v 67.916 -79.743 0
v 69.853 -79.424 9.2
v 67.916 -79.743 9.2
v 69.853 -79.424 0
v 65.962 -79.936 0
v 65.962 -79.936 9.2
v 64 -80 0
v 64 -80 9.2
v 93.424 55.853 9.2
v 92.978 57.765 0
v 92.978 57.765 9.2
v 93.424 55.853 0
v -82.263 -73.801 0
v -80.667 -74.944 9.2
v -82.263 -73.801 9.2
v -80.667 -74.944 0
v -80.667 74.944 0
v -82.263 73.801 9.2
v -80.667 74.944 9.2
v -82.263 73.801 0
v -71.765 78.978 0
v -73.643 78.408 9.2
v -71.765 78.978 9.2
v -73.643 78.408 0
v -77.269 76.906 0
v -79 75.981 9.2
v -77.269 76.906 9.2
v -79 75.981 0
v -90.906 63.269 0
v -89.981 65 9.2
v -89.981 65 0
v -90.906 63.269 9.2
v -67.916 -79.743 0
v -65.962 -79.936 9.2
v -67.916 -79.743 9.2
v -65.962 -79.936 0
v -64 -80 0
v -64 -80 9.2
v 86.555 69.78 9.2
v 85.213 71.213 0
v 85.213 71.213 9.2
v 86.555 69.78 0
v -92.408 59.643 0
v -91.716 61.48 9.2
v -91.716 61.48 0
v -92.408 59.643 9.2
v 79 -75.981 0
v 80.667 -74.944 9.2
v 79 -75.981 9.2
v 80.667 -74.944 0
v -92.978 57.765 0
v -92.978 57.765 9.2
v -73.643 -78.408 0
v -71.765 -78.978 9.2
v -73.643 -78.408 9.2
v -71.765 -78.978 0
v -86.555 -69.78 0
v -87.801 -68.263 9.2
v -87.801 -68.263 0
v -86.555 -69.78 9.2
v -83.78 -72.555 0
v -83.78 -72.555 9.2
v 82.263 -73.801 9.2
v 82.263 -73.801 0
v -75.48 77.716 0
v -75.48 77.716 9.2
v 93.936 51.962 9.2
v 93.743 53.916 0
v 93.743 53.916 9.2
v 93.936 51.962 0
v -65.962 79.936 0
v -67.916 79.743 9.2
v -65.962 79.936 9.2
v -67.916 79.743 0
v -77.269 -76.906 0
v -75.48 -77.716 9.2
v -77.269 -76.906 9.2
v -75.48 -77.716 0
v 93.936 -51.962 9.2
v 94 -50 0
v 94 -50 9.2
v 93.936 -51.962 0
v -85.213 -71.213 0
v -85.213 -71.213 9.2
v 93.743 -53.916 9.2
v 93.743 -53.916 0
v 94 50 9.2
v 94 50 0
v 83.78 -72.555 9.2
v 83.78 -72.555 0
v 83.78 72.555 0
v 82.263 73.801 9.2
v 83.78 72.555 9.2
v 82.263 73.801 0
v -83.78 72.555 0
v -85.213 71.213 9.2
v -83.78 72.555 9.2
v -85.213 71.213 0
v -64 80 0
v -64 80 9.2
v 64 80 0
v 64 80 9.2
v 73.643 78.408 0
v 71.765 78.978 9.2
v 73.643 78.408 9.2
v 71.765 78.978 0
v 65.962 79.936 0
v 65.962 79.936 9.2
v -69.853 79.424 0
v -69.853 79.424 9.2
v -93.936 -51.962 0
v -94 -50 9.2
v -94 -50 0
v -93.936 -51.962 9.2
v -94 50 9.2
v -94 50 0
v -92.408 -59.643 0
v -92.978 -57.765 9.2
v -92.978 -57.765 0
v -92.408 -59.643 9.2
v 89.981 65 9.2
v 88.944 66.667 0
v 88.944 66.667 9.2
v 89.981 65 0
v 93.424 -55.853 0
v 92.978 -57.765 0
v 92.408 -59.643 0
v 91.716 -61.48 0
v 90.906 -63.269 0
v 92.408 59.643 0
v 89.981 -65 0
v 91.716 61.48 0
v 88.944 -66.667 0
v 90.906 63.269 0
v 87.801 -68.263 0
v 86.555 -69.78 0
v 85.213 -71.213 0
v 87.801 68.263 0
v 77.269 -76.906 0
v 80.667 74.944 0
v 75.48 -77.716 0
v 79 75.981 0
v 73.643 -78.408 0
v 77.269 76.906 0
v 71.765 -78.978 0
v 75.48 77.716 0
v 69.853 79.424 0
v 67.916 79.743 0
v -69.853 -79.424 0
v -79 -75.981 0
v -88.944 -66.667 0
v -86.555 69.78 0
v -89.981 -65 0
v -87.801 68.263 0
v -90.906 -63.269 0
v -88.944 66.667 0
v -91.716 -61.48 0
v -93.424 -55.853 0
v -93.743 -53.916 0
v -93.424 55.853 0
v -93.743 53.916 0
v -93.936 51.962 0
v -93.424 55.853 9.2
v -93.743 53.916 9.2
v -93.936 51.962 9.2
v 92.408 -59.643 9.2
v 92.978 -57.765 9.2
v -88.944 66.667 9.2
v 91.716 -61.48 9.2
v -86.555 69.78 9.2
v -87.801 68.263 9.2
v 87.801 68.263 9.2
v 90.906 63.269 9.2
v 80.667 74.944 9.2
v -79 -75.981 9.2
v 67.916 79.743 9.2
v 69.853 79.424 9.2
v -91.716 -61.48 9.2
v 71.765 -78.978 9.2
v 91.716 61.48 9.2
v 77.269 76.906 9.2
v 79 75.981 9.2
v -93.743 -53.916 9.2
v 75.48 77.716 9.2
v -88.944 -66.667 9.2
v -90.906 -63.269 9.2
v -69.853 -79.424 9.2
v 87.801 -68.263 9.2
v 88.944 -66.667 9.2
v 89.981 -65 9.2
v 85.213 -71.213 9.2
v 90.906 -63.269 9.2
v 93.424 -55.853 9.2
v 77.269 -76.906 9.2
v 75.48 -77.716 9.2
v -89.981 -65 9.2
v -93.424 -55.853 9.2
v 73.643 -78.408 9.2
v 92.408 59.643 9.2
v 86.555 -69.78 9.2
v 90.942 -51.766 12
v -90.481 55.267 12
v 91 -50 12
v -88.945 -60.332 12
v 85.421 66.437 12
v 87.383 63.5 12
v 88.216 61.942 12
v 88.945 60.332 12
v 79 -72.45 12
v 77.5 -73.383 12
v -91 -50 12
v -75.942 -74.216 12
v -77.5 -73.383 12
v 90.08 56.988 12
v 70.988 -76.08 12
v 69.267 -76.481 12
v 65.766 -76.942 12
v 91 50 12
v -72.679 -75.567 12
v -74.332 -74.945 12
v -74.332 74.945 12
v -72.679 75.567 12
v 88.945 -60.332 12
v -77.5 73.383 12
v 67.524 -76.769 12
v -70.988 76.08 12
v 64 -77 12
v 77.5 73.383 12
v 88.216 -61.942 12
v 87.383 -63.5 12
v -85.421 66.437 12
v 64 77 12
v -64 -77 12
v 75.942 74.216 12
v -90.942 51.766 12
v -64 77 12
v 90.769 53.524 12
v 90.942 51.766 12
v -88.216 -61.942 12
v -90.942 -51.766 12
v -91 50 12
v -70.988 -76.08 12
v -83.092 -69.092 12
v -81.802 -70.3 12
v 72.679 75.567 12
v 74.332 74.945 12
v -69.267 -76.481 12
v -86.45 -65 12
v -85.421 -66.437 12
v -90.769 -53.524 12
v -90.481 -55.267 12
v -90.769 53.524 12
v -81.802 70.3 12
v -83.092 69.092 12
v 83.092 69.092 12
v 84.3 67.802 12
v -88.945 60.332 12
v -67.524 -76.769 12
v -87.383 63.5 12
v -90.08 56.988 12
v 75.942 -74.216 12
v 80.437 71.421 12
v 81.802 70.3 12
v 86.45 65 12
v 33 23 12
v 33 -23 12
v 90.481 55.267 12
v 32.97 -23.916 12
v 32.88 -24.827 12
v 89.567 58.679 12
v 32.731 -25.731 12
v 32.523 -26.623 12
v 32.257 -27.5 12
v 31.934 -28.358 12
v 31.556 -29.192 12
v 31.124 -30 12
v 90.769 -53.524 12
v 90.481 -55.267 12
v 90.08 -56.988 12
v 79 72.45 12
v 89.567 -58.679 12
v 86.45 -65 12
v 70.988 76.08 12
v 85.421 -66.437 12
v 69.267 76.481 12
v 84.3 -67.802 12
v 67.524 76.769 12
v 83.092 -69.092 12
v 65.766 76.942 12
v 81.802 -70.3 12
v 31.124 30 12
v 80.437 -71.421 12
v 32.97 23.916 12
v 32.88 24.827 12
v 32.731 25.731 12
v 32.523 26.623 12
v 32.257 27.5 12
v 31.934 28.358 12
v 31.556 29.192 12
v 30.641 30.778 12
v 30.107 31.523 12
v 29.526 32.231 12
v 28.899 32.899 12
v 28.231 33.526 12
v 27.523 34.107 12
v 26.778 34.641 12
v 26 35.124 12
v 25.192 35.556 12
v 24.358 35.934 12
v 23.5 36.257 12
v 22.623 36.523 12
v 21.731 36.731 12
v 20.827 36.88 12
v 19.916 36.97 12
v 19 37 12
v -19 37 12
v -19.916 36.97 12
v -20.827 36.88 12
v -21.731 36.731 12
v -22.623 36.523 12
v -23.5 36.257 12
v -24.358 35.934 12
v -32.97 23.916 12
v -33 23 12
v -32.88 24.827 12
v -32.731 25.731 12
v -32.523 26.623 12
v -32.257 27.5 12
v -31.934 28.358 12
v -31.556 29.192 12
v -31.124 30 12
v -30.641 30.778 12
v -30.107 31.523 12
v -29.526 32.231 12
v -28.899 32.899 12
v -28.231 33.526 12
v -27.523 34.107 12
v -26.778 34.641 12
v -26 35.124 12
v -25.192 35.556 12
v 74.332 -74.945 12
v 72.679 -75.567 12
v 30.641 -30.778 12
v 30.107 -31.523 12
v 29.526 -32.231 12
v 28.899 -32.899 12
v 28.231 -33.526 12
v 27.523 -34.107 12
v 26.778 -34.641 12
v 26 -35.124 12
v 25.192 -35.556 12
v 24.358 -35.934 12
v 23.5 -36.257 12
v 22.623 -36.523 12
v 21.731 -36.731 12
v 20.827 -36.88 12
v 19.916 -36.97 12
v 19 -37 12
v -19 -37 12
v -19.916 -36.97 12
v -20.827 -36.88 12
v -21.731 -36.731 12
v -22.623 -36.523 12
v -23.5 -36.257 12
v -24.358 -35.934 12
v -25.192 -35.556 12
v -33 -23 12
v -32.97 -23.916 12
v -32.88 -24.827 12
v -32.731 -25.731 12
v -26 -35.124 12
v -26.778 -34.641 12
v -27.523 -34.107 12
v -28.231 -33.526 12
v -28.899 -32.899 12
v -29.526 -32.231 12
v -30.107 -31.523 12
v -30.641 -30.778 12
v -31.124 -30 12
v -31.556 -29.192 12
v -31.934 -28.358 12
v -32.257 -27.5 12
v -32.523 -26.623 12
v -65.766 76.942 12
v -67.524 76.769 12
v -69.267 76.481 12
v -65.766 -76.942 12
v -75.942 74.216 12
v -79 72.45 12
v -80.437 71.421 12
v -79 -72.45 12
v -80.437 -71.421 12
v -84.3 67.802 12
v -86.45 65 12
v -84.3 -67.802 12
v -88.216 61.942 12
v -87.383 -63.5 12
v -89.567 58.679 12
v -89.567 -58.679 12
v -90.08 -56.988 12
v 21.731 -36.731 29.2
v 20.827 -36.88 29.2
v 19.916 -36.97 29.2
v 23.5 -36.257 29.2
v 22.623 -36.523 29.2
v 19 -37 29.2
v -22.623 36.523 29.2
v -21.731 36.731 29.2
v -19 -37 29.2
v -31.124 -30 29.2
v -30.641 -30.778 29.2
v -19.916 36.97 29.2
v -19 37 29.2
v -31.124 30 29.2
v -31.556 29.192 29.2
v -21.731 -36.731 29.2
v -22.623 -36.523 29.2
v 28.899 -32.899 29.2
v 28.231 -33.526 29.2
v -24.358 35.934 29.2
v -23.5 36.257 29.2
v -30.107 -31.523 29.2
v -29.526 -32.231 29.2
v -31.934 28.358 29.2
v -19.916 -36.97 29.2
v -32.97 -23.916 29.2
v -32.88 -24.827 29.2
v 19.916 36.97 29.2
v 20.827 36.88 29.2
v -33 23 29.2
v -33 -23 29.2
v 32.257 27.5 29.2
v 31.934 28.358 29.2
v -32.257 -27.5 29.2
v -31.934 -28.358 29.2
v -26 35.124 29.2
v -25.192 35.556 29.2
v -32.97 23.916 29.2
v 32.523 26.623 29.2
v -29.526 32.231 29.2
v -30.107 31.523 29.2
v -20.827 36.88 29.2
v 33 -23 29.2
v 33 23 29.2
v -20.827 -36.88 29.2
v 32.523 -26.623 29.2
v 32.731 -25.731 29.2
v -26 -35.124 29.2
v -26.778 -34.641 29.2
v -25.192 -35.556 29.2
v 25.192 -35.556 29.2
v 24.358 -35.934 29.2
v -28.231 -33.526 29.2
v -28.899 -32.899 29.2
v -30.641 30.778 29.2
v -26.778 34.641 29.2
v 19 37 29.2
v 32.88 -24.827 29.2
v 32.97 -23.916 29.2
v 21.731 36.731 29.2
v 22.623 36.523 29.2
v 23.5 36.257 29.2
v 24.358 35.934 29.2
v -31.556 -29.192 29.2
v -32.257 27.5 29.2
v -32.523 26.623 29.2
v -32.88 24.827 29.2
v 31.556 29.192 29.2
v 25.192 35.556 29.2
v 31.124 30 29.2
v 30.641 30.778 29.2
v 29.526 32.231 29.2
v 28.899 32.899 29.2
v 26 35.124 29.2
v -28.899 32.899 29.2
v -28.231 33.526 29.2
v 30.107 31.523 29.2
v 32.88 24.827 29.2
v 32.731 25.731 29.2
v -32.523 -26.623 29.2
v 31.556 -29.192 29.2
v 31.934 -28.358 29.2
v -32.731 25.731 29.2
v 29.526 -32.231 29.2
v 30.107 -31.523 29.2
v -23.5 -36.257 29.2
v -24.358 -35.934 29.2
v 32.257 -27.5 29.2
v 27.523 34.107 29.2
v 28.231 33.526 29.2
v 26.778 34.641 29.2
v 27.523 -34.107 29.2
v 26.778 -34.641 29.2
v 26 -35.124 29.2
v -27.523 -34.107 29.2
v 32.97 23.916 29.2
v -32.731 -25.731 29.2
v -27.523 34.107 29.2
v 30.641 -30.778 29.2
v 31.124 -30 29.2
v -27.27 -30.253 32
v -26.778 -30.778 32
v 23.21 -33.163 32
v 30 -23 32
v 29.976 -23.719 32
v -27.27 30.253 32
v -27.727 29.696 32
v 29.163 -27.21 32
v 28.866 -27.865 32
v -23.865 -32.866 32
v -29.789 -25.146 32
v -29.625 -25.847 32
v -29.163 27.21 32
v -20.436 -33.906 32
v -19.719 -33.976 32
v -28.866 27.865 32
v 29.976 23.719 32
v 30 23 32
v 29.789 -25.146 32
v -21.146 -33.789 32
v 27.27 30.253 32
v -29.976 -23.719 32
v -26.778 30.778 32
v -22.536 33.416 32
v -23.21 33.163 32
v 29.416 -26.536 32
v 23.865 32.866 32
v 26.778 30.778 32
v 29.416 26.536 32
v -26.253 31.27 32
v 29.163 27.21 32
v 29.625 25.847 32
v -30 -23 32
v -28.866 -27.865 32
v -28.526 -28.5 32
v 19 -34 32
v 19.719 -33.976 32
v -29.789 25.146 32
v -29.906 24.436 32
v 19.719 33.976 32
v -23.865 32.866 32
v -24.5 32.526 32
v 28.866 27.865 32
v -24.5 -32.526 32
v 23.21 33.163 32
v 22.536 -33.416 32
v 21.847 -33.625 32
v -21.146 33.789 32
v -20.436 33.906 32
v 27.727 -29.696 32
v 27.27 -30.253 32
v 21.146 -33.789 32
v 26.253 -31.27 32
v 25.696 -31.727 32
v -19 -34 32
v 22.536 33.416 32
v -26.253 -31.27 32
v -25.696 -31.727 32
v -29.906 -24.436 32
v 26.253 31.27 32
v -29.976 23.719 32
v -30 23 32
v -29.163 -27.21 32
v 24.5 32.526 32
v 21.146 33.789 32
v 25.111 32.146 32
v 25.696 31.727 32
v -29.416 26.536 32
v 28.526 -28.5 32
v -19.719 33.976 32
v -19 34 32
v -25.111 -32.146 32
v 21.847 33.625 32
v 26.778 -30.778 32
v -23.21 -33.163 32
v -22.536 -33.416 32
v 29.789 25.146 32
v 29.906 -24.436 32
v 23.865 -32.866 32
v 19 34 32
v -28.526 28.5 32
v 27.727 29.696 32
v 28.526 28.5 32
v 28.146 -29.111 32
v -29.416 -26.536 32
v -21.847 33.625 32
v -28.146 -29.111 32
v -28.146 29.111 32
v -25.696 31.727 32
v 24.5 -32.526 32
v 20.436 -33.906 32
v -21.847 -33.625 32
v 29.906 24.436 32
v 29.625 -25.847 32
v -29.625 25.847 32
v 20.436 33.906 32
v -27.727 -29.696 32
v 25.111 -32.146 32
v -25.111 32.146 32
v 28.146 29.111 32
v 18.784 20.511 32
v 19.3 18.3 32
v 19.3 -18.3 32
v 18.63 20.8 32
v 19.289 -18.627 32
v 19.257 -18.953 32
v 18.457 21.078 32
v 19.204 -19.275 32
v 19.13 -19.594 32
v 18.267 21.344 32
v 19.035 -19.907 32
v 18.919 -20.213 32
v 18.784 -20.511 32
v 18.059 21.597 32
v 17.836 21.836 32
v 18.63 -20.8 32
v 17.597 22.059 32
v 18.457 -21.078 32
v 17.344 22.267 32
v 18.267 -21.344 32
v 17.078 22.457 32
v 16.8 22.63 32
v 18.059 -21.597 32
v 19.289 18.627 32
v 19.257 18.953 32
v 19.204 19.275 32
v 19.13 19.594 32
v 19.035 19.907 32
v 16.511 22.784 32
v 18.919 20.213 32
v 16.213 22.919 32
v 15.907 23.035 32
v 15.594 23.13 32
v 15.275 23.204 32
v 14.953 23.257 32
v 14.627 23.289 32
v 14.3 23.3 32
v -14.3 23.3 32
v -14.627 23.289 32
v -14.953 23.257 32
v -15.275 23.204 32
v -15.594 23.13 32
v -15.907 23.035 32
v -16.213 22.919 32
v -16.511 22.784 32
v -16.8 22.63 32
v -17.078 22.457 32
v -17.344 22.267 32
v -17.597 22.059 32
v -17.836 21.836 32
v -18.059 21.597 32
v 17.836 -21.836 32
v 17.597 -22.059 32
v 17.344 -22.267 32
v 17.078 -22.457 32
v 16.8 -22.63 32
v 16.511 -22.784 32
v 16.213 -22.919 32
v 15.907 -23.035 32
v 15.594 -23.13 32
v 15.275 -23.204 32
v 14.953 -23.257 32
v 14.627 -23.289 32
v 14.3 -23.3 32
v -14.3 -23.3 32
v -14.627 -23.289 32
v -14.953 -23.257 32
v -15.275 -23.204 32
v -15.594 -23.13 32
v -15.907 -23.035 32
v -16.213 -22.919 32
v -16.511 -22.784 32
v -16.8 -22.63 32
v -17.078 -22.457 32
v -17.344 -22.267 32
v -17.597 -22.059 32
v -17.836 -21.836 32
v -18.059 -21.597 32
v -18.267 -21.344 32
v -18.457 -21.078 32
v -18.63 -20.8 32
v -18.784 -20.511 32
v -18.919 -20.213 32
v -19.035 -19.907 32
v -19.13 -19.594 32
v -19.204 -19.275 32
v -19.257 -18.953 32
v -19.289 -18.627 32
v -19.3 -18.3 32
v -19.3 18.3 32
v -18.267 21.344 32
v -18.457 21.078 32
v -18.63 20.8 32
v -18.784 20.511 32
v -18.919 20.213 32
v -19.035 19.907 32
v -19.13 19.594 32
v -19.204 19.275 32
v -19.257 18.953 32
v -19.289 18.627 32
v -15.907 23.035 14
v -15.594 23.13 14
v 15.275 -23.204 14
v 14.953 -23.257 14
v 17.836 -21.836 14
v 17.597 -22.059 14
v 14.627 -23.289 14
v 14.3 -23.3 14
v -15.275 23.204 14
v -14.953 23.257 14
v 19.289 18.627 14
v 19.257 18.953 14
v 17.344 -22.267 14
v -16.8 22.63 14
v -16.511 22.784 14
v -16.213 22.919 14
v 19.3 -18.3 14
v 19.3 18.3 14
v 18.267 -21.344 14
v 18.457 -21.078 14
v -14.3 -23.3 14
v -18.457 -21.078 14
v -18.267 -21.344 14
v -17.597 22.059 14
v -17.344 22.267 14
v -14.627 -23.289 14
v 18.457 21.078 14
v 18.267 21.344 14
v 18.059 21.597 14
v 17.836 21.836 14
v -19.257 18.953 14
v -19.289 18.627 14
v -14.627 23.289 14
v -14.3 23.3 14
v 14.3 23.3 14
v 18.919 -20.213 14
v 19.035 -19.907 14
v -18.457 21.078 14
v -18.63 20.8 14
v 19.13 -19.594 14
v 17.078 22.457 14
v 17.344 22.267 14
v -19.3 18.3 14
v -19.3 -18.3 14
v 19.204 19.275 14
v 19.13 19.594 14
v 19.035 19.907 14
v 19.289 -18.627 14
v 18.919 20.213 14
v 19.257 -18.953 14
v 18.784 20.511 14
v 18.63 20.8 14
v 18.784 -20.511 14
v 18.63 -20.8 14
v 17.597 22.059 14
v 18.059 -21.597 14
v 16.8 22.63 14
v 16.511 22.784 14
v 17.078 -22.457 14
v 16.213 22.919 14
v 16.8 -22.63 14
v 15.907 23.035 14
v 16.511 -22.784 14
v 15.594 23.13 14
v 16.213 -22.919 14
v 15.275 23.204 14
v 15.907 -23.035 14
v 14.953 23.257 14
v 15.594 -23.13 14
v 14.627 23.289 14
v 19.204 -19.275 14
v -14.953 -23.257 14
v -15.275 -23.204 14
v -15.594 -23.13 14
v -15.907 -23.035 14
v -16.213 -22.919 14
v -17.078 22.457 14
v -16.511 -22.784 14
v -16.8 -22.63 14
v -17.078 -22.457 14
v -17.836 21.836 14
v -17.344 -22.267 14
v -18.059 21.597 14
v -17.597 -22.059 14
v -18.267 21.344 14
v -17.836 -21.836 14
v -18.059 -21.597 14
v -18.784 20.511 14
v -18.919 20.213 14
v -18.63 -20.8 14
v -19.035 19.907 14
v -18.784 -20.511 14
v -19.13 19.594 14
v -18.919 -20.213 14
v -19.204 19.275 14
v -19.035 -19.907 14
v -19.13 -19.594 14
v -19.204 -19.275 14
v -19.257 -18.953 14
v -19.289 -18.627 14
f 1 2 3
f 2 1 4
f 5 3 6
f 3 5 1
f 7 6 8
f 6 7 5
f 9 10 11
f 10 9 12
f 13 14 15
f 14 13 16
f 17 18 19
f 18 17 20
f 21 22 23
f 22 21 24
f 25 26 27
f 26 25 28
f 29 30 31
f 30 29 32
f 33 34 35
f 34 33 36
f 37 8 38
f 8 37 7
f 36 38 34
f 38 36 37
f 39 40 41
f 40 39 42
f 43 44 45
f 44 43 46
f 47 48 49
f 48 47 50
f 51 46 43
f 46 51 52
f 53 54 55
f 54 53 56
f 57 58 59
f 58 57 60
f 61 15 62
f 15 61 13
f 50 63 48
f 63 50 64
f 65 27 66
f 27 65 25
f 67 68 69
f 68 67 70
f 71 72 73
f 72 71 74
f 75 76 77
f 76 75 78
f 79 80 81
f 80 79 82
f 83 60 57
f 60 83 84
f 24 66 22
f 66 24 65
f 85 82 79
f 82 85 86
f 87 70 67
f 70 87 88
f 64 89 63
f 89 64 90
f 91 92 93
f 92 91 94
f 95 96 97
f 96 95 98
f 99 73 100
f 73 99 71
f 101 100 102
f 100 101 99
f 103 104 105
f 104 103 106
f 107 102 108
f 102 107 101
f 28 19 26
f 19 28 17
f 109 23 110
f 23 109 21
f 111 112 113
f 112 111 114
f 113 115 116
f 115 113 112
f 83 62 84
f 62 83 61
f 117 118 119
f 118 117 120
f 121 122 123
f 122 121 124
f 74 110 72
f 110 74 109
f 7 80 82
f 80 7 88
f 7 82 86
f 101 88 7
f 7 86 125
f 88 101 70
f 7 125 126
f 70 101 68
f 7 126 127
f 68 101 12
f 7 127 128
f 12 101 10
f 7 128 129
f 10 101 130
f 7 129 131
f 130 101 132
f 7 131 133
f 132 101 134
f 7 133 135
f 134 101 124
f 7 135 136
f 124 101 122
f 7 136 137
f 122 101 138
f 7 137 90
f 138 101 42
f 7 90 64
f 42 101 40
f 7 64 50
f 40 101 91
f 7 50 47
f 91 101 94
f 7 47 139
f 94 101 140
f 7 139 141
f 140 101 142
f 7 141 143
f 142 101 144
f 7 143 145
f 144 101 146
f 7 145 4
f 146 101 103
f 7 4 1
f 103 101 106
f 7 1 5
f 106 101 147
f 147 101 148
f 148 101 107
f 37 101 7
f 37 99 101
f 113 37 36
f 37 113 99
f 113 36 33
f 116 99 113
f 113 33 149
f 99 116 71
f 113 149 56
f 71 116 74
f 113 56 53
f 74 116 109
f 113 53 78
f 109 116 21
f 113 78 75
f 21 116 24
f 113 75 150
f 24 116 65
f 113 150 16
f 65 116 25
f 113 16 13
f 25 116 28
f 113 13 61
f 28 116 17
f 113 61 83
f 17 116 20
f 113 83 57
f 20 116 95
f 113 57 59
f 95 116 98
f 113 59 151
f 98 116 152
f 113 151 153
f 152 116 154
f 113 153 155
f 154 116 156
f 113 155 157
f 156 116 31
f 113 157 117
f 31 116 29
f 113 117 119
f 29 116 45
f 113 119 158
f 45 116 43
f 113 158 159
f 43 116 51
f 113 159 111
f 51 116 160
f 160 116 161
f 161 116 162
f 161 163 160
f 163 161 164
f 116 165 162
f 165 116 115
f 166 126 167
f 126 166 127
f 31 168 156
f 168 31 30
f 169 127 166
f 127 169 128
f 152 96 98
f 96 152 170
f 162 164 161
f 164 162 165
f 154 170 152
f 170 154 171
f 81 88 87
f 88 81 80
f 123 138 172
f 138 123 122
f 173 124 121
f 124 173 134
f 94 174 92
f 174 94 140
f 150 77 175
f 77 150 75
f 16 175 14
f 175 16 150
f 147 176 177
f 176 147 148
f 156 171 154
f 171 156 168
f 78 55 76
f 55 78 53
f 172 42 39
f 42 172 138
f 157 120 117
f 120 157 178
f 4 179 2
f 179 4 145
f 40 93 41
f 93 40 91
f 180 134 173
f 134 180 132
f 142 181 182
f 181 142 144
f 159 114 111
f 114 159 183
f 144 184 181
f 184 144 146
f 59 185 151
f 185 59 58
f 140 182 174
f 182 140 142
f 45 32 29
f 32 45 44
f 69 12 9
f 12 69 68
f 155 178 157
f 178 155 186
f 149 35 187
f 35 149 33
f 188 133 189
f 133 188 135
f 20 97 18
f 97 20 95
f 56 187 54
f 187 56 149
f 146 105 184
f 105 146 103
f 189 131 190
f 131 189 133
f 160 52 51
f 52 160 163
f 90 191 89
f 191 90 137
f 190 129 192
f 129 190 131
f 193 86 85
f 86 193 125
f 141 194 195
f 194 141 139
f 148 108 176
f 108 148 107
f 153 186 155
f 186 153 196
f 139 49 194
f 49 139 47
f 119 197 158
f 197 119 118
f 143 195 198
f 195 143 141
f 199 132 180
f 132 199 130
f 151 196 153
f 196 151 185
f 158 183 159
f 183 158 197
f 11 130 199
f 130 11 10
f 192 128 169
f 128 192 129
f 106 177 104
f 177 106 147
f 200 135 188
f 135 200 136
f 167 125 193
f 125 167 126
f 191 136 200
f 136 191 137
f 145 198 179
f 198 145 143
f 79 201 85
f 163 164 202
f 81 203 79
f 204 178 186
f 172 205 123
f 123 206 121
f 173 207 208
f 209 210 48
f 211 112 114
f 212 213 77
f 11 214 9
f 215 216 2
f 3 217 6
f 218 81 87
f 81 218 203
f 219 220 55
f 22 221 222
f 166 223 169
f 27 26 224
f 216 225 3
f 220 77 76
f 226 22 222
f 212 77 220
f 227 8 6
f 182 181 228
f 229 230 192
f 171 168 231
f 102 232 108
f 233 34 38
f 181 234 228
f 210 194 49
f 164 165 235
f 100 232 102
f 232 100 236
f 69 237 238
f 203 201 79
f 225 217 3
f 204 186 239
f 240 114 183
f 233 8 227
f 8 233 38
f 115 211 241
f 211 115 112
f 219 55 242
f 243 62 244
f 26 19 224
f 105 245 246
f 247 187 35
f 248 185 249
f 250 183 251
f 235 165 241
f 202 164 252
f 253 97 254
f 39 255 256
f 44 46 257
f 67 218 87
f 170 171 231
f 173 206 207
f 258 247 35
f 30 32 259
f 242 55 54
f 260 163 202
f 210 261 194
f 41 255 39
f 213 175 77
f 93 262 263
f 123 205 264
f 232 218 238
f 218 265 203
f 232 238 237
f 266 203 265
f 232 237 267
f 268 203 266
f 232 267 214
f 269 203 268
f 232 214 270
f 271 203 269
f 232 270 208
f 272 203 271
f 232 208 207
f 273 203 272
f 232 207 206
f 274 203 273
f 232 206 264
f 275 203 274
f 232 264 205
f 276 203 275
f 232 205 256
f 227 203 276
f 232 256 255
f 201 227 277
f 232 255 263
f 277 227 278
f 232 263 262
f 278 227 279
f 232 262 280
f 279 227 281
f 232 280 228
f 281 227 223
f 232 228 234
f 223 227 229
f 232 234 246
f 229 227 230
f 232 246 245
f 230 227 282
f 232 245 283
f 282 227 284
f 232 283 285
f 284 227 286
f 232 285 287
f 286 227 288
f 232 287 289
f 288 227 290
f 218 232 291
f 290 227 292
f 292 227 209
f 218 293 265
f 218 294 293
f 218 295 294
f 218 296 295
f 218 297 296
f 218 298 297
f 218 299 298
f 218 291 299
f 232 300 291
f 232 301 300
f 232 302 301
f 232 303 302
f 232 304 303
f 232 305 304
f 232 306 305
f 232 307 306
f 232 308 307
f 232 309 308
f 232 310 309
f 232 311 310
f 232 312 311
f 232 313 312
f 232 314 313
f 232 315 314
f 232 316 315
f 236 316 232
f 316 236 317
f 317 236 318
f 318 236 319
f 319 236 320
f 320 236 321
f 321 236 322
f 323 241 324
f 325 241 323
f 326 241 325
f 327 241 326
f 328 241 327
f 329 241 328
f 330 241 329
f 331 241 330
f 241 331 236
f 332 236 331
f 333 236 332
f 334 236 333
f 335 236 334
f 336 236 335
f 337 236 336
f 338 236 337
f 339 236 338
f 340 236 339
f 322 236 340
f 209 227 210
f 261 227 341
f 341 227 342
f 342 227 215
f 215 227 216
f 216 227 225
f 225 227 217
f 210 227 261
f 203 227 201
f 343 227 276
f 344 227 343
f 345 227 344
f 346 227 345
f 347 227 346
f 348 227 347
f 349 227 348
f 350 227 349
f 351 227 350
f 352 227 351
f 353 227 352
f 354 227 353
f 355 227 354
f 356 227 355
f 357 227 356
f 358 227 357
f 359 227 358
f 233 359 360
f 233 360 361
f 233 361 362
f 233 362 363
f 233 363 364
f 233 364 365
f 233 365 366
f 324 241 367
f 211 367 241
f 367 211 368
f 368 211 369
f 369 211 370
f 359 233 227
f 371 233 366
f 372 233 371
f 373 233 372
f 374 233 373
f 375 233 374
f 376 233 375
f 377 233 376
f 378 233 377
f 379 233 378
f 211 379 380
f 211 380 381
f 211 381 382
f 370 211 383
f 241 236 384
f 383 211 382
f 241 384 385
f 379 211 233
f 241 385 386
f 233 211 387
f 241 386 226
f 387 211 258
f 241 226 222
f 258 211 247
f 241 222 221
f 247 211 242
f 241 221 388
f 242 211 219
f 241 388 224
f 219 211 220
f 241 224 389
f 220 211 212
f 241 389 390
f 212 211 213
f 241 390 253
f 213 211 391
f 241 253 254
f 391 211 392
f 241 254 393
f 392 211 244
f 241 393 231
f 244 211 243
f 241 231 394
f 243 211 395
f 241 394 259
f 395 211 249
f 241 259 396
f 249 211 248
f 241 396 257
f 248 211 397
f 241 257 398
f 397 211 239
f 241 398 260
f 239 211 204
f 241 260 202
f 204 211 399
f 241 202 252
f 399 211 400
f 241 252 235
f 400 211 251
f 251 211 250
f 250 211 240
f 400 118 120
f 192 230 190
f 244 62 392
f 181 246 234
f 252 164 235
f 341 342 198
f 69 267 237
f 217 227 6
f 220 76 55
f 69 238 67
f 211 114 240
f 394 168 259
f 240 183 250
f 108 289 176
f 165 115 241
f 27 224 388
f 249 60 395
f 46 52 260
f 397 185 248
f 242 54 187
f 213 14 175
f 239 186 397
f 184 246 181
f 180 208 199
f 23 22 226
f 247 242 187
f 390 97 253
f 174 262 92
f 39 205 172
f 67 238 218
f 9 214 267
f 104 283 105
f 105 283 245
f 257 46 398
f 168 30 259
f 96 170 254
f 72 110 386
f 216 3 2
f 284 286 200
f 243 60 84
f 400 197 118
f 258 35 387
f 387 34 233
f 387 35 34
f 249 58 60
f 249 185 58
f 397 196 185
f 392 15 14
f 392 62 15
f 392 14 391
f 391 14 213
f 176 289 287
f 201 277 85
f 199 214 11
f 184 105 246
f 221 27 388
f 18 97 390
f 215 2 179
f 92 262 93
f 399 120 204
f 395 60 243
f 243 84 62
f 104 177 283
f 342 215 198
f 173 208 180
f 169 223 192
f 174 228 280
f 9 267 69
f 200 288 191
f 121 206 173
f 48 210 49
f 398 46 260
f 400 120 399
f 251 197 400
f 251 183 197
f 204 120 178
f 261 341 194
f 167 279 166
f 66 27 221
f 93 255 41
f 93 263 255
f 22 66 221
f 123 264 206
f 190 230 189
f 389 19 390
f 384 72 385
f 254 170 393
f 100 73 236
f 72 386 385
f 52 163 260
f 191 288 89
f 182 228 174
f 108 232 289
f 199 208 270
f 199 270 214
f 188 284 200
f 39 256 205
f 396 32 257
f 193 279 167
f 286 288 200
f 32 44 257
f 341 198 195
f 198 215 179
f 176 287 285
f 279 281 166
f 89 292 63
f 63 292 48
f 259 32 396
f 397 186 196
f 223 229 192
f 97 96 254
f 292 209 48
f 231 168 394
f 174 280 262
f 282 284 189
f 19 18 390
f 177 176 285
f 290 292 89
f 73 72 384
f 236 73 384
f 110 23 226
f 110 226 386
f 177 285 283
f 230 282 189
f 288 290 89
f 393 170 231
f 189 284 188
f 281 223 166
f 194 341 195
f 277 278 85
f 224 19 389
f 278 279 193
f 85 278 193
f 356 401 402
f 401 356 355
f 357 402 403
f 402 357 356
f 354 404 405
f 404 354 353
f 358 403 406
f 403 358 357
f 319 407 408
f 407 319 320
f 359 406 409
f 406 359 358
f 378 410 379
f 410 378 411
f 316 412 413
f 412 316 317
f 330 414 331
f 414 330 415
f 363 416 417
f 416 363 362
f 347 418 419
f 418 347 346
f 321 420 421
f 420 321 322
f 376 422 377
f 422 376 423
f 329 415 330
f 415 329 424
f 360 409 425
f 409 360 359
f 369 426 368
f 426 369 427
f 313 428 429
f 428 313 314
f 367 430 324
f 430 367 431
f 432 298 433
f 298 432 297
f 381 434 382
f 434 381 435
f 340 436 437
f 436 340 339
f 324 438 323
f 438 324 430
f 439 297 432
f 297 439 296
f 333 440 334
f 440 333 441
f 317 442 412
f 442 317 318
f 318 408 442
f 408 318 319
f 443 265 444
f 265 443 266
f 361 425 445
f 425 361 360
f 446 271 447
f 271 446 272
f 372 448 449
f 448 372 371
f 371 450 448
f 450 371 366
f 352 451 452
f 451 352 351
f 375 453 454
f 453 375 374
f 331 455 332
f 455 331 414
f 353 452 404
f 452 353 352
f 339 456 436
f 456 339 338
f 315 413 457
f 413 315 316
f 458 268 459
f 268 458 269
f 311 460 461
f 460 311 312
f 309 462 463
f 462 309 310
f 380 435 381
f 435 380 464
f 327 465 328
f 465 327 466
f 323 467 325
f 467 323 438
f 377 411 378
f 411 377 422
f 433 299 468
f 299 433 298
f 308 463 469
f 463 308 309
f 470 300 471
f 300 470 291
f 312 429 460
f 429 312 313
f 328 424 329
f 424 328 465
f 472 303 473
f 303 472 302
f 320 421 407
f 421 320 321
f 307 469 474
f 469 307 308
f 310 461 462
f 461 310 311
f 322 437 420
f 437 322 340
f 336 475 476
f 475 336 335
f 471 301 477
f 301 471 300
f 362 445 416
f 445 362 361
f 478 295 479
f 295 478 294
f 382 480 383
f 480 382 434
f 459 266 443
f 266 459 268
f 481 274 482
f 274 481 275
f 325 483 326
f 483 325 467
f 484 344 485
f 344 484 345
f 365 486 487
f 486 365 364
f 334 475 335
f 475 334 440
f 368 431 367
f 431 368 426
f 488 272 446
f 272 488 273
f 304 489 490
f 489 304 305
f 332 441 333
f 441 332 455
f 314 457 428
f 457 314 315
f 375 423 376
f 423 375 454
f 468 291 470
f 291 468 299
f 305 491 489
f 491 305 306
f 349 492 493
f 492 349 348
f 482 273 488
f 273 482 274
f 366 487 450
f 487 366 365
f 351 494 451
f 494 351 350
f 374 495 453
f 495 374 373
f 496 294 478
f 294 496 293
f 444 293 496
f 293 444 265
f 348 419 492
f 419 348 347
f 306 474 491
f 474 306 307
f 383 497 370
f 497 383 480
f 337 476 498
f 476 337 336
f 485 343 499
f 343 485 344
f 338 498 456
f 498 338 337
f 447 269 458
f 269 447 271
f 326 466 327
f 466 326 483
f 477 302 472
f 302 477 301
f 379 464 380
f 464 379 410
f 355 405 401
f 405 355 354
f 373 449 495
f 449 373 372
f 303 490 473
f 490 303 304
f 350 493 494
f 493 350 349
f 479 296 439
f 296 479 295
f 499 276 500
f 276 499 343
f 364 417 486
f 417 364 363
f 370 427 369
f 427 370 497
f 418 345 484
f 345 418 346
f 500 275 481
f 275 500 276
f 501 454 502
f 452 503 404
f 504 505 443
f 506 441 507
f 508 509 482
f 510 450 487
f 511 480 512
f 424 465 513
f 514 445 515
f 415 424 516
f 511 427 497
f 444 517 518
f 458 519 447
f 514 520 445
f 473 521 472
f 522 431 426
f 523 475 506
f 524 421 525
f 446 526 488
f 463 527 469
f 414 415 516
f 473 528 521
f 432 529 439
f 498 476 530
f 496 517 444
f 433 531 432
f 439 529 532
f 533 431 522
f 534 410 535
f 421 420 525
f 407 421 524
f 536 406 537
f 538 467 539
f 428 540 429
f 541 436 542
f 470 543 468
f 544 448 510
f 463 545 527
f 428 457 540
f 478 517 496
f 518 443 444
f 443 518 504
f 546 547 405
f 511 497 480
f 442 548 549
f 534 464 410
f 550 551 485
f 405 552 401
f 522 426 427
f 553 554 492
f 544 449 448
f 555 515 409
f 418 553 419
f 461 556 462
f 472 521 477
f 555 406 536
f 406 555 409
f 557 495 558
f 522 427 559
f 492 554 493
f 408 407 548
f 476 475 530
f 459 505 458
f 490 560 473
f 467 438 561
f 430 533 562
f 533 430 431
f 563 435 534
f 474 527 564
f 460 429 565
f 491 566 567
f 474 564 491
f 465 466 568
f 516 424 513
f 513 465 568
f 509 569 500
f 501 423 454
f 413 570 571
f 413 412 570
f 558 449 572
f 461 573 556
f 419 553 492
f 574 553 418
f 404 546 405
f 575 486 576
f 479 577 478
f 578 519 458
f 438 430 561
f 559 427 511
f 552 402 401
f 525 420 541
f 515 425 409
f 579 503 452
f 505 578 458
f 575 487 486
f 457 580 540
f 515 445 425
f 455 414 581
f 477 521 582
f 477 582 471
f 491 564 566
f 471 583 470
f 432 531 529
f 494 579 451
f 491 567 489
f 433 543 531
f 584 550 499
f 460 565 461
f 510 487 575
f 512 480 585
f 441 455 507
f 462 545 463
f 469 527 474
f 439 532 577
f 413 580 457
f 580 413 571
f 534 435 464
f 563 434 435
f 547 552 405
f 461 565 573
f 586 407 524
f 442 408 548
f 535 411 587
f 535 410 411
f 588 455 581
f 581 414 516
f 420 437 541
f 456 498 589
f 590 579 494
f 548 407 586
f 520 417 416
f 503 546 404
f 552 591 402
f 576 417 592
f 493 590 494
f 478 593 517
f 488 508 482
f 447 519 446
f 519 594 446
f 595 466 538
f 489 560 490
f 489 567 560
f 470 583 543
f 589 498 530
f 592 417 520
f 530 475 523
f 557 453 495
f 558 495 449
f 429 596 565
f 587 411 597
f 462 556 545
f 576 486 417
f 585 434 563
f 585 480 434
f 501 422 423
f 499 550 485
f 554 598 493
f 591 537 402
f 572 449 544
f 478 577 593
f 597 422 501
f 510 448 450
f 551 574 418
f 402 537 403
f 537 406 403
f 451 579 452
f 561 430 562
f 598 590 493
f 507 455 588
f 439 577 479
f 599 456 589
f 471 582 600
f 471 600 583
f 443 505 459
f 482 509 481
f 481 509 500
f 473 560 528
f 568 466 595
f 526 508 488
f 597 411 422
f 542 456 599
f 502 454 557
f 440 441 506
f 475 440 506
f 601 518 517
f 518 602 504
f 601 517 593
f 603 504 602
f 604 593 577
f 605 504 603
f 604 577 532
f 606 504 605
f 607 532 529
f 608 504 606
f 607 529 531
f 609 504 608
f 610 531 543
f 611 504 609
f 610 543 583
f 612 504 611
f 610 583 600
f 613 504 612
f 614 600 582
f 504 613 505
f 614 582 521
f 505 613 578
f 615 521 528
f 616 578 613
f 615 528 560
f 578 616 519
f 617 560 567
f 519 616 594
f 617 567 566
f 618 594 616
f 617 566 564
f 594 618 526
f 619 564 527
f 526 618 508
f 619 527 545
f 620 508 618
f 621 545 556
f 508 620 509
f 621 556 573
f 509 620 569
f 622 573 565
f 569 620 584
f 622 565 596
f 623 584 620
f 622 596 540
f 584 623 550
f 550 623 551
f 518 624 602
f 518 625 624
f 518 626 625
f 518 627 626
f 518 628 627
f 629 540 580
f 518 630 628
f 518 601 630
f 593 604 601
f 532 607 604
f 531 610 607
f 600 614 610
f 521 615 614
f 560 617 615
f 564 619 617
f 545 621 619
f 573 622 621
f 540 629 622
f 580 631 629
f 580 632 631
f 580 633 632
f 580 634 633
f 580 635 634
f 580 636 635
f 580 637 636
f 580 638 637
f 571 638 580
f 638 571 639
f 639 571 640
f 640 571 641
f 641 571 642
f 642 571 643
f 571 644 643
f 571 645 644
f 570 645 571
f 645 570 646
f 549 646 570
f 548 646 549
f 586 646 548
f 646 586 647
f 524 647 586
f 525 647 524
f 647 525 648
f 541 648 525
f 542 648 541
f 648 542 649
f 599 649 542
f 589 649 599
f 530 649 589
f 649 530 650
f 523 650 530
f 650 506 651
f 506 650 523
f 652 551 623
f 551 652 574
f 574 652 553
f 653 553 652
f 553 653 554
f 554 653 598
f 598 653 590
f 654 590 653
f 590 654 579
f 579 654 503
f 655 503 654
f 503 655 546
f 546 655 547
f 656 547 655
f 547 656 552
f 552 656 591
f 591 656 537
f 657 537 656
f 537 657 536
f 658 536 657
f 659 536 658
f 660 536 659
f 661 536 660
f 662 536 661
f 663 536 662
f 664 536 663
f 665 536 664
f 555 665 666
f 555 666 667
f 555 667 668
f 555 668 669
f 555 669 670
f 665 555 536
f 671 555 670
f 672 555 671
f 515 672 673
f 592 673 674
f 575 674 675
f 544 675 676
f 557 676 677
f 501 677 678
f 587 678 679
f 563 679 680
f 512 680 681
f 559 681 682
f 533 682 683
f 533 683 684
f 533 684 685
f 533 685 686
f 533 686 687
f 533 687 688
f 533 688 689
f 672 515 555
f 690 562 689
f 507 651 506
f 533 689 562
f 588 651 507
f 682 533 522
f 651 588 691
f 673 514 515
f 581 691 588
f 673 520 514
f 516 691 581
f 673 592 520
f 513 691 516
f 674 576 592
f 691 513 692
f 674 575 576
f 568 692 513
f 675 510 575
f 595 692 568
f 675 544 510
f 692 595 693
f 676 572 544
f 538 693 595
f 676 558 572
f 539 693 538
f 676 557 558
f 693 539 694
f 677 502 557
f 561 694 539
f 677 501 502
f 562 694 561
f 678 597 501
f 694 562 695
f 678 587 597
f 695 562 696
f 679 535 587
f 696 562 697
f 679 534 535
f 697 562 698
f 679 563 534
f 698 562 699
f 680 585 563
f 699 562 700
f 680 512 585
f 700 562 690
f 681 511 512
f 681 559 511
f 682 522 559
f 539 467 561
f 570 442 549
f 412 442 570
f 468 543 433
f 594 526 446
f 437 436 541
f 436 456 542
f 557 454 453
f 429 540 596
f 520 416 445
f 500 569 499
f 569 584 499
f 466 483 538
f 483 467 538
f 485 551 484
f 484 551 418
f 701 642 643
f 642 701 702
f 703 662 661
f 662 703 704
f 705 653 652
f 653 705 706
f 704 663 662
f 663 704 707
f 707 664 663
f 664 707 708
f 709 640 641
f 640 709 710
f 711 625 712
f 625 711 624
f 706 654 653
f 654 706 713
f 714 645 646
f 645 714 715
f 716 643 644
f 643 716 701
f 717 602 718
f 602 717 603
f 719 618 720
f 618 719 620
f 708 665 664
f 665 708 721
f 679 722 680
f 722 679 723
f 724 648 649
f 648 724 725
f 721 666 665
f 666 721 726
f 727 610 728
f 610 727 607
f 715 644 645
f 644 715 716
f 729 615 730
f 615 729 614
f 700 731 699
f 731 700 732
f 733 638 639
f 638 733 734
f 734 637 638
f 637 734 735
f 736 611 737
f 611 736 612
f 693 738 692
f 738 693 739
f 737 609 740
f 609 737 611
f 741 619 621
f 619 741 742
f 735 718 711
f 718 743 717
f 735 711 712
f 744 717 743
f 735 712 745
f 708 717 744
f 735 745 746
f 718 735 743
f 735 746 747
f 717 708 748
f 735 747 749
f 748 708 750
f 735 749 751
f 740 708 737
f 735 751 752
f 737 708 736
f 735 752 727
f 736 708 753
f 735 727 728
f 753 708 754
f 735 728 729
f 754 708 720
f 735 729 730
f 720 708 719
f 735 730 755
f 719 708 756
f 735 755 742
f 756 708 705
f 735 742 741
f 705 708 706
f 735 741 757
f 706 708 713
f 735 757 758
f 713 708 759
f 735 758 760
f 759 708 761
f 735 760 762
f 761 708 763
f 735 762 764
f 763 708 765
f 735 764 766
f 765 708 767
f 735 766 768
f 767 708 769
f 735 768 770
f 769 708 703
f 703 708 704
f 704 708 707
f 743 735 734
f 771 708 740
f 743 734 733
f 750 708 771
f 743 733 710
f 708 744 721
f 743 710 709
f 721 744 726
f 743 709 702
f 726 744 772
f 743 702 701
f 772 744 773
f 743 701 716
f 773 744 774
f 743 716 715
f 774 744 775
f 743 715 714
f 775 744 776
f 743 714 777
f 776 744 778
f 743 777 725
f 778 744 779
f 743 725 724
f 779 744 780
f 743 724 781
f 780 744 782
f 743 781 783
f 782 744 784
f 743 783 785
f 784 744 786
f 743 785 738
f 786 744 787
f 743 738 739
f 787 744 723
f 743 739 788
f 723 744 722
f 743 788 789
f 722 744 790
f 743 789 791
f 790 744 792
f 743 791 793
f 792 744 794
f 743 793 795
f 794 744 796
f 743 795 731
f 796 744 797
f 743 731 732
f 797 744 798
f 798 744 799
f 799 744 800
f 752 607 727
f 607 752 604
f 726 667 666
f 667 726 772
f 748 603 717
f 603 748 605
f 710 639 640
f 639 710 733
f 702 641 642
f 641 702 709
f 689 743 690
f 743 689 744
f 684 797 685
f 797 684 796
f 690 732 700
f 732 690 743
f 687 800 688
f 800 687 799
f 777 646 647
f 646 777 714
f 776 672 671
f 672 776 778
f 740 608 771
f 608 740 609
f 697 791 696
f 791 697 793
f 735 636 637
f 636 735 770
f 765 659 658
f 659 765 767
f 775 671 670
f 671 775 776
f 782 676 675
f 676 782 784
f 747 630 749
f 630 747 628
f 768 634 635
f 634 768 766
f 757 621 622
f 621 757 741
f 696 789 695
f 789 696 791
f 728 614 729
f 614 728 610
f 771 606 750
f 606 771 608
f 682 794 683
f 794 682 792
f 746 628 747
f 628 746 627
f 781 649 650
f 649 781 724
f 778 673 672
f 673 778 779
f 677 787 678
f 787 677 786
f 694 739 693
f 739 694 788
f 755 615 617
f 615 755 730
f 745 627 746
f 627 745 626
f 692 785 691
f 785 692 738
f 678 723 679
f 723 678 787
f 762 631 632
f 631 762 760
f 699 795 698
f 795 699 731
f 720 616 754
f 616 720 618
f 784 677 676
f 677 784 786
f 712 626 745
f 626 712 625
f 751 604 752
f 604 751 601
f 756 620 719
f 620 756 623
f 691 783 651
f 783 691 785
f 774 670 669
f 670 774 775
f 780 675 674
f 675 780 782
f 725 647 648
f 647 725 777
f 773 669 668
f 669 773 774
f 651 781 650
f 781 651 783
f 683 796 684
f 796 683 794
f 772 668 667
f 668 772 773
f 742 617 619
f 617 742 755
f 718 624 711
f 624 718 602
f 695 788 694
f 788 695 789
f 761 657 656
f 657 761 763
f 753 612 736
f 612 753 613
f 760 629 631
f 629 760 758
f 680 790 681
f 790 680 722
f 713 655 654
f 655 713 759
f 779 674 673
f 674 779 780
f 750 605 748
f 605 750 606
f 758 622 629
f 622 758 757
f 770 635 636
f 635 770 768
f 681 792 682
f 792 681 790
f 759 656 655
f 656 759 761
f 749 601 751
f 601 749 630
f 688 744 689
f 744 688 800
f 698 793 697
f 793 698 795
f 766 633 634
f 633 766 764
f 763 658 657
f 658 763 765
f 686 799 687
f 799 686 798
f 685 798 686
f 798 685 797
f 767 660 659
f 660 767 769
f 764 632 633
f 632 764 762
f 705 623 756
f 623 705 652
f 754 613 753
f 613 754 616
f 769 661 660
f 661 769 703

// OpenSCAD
// Headphone stand in three printable parts: base, post, hanger.
// No glue, no screws. Rectangular (non-round) blade tenons prevent spinning.
// All dimensions in mm. Print orientation is the exported orientation (+Z up).
//
// Assembly heights (assembly coordinates, desk at z=0):
//   base plate/boss top        0 .. 32
//   post                       14.5 .. 250  (17.5 mm of it inside the base socket)
//   hanger tenon               228.5 .. 250 (21.5 mm inside the post socket)
//   hanger saddle top centre   270
// Socket clearances: 0.3 mm per side (socket is tenon + 0.6 in each dimension),
// tenon tips stop 0.5 mm above socket floors; shoulders/faces give the depth stop
// for the hanger, and the post bottoms in its socket.

part = "base"; // [base, post, hanger, assembly]
cadverify_only = "";

$fn = 96;

/* [Base] */
base_w = 188;          // desk footprint, X
base_d = 160;          // desk footprint, Y
base_plate_top = 9;    // straight plate wall up to here, then 45 deg chamfer to 12
base_top_plate = 12;
boss_w = 66;
boss_d = 74;
boss_straight_top = 29; // then 45 deg chamfer to boss_top
boss_top = 32;
base_socket_w = 38.6;  // post 38 + 0.6
base_socket_d = 46.6;  // post 46 + 0.6
base_socket_floor = 14;

/* [Post] */
post_w = 38;
post_d = 46;
post_len = 235.5;      // tip (local z=0) to top (assembly 250)
post_top_socket_w = 24.6; // hanger tenon 24 + 0.6
post_top_socket_d = 34.6; // hanger tenon 34 + 0.6
post_top_socket_floor_local = 213.5; // assembly 228

/* [Hanger, modelled in print coordinates] */
// Print coordinates: X = saddle length, Y = height above tenon tip,
// Z = saddle width direction (part lies on its Z=0 side face on the bed).
hang_len_half = 69;    // overall saddle half length incl. rounded end point
hang_width = 34;       // >= 30 mm headband support width
hang_top_rel = 41.5;   // tenon tip to saddle crown; assembly 228.5 + 41.5 = 270
hang_arc_r = 170;      // crown radius of the headband contact surface
hang_plate_t = 10;     // saddle plate thickness (vertical, in profile)
hang_tenon_half_w = 12;  // tenon is 24 (X) x 34 (width)
hang_shoulder_rel = 21.5; // assembly 250, post top
hang_neck_half_w = 17;

function hang_top_z(x) = hang_top_rel - (hang_arc_r - sqrt(hang_arc_r*hang_arc_r - x*x));
function hang_bot_z(x) = hang_top_z(x) - hang_plate_t;

module rounded_rect(w, d, r) {
    offset(r = r) square([w - 2*r, d - 2*r], center = true);
}

module instance(name, part_name, unit = 1) {
    echo(cadverify_instance = [name, part_name, unit]);
    if (cadverify_only == "" || cadverify_only == name) children();
}

/* ---------- BASE (print = assembly orientation) ---------- */
module base_part() {
    difference() {
        union() {
            // desk plate with 45 deg top edge chamfer
            linear_extrude(base_plate_top) rounded_rect(base_w, base_d, 30);
            hull() {
                translate([0, 0, base_plate_top]) linear_extrude(0.2)
                    rounded_rect(base_w, base_d, 30);
                translate([0, 0, base_top_plate - 0.2]) linear_extrude(0.2)
                    rounded_rect(base_w - 6, base_d - 6, 27);
            }
            // raised boss / collar around the post socket, 45 deg top chamfer
            translate([0, 0, base_top_plate])
                linear_extrude(boss_straight_top - base_top_plate)
                    rounded_rect(boss_w, boss_d, 14);
            hull() {
                translate([0, 0, boss_straight_top]) linear_extrude(0.2)
                    rounded_rect(boss_w, boss_d, 14);
                translate([0, 0, boss_top - 0.2]) linear_extrude(0.2)
                    rounded_rect(boss_w - 6, boss_d - 6, 11);
            }
        }
        // blind rectangular socket for the post (stops post spinning)
        translate([0, 0, base_socket_floor])
            linear_extrude(boss_top - base_socket_floor + 2)
                rounded_rect(base_socket_w, base_socket_d, 5);
    }
}

/* ---------- POST (printed upright, local z=0 is tenon tip) ---------- */
module post_part() {
    difference() {
        linear_extrude(post_len) rounded_rect(post_w, post_d, 8);
        // blind rectangular socket in the top for the hanger blade tenon
        translate([0, 0, post_top_socket_floor_local])
            linear_extrude(post_len - post_top_socket_floor_local + 2)
                rounded_rect(post_top_socket_w, post_top_socket_d, 5);
    }
}

/* ---------- HANGER (printed on its side) ---------- */
module hanger_part() {
    top_pts    = [for (x = [56 : -8 : -56]) [x, hang_top_z(x)]];
    bot_r_pts  = [for (x = [40 : 8 : 64]) [x, hang_bot_z(x)]];
    bot_l_pts  = [for (x = [-64 : 8 : -40]) [x, hang_bot_z(x)]];
    mid64 = (hang_top_z(64) + hang_bot_z(64)) / 2;
    // Saddle/neck profile above the shoulder plane (print y = hang_shoulder_rel).
    profile = concat(
        [[-hang_neck_half_w, hang_shoulder_rel], [hang_neck_half_w, hang_shoulder_rel],
         [30, hang_bot_z(30)]],
        bot_r_pts,
        [[hang_len_half - 0.5, mid64], [64, hang_top_z(64)]],
        top_pts,
        [[-64, hang_top_z(64)], [-(hang_len_half - 0.5), mid64], [-64, hang_bot_z(64)]],
        bot_l_pts,
        [[-30, hang_bot_z(30)]]
    );
    difference() {
        union() {
            linear_extrude(hang_width) polygon(profile);
            // Blade tenon below the shoulder: 24 x 34 with 4 mm corner radii,
            // so it clears the post socket's 5 mm rounded corners. It reaches
            // 2 mm up into the neck so the union is volumetric, not face-only.
            translate([0, 0, hang_width/2]) rotate([-90, 0, 0])
                linear_extrude(hang_shoulder_rel + 2)
                    rounded_rect(2*hang_tenon_half_w, hang_width, 4);
        }
        // 45 deg chamfers on the two crown side edges, centre contact zone only.
        // Plane (print coords): Z + Y = 38.5 + 34 on the far side ...
        translate([0, 38.5, hang_width]) rotate([-45, 0, 0])
            translate([-85, -40, 0]) cube([170, 80, 40]);
        // ... and Z - Y = -38.5 on the bed side.
        translate([0, 38.5, 0]) rotate([45, 0, 0])
            translate([-85, -40, -40]) cube([170, 80, 40]);
    }
}

/* ---------- Spec echoes ---------- */
if (part == "base") {
    echo(cadverify_spec = [
        ["bounds", [[-base_w/2, -base_d/2, 0], [base_w/2, base_d/2, boss_top]]],
        ["bodies", 1],
        ["through_holes", 0],
        ["support_faces", [["desk", "-z", 25000]]],
        ["overhangs_allowed", []],
        ["copies", 1],
        ["details", [
            ["plate", "material", [[-80, -60, 2], [80, 60, 10]], 0.99],
            ["boss_wall", "material", [[22, -30, 16], [31, 30, 28]], 0.99],
            ["post_socket", "void", [[-17, -21, 16], [17, 21, 30]], 0.99],
            ["socket_floor", "thickness", [0, 0, 42], [0, 0, -1], base_socket_floor],
            ["boss_socket_top", "view", [[-34, -38, 27], [34, 38, boss_top]]]
        ]]
    ]);
} else if (part == "post") {
    echo(cadverify_spec = [
        ["bounds", [[-post_w/2, -post_d/2, 0], [post_w/2, post_d/2, post_len]]],
        ["bodies", 1],
        ["through_holes", 0],
        ["support_faces", [["bed", "-z", 1500]]],
        ["overhangs_allowed", []],
        ["copies", 1],
        ["details", [
            ["column", "material", [[-16, -20, 30], [16, 20, 200]], 0.99],
            ["hanger_socket", "void", [[-10, -15, 216], [10, 15, 234]], 0.99],
            ["column_width", "thickness", [32, 0, 100], [-1, 0, 0], post_w],
            ["top_socket", "view", [[-19, -23, 210], [19, 23, post_len]]]
        ]]
    ]);
} else if (part == "hanger") {
    // actual extreme points are the saddle end tips at +-(hang_len_half - 0.5)
    echo(cadverify_spec = [
        ["bounds", [[-(hang_len_half - 0.5), 0, 0], [hang_len_half - 0.5, hang_top_rel, hang_width]]],
        ["bodies", 1],
        ["through_holes", 0],
        ["support_faces", [["bed", "-z", 1200]]],
        ["overhangs_allowed", [
            ["45deg crown chamfer on bed side", [[-36, 37, 0], [36, hang_top_rel, 5]]]
        ]],
        ["copies", 1],
        ["details", [
            ["saddle_plate", "material", [[-25, 32, 5], [25, 38, 29]], 0.99],
            ["tenon", "material", [[-10, 2, 5], [10, 20, 29]], 0.99],
            ["saddle_thickness", "thickness", [50, 52, 17], [0, -1, 0], hang_plate_t],
            ["rounded_crown", "view", [[-40, 27, 0], [40, hang_top_rel, hang_width]]]
        ]]
    ]);
} else if (part == "assembly") {
    echo(cadverify_spec = [
        ["bounds", [[-base_w/2, -base_d/2, 0], [base_w/2, base_d/2, 270]]],
        ["support_faces", [["desk", "-z", 25000]]],
        ["allowed_interferences", []],
        ["assembly_order", [
            [["base"], [0, 0, 0]],
            [["post"], [0, 0, -1]],
            [["hanger"], [0, 0, -1]]
        ]]
    ]);
}

/* ---------- Output ---------- */
if (part == "base") {
    base_part();
} else if (part == "post") {
    post_part();
} else if (part == "hanger") {
    hanger_part();
} else if (part == "assembly") {
    instance("base", "base") base_part();
    instance("post", "post") translate([0, 0, 14.5]) post_part();
    // hanger print coords (x, y=height rel. tenon tip, z=width)
    //   -> assembly (x, 17-z, 228.5+y): tenon tip at 228.5, crown at 270
    instance("hanger", "hanger")
        translate([0, hang_width/2, 228.5]) rotate([90, 0, 0]) hanger_part();
} else {
    assert(false, str("unknown part: ", part));
}
